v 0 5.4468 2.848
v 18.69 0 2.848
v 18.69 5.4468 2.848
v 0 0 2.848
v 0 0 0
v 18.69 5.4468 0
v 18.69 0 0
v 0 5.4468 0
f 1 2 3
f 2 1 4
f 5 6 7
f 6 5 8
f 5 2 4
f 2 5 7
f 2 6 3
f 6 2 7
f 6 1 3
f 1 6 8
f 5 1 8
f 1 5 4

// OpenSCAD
$fn = 360;

// Actual measured button dimensions in mm.
ACTUAL_LENGTH = 5.25;
ACTUAL_WIDTH = 1.53;
ACTUAL_HEIGHT = 0.8;

// set to how much larger than actual it should be.
SCALING_FACTOR = 3.56;

// false is just the minus. true will do the plus
DRAW_PLUS = false;

scale(v = [SCALING_FACTOR, SCALING_FACTOR, SCALING_FACTOR]) {

    cube([ACTUAL_LENGTH, ACTUAL_WIDTH, ACTUAL_HEIGHT]);

    if (DRAW_PLUS) {
        translate([ACTUAL_LENGTH / 2 - ACTUAL_WIDTH / 2, -ACTUAL_LENGTH / 2 + ACTUAL_WIDTH / 2, 0]) {
            cube([ACTUAL_WIDTH, ACTUAL_LENGTH, ACTUAL_HEIGHT]);
        }
    }

}
